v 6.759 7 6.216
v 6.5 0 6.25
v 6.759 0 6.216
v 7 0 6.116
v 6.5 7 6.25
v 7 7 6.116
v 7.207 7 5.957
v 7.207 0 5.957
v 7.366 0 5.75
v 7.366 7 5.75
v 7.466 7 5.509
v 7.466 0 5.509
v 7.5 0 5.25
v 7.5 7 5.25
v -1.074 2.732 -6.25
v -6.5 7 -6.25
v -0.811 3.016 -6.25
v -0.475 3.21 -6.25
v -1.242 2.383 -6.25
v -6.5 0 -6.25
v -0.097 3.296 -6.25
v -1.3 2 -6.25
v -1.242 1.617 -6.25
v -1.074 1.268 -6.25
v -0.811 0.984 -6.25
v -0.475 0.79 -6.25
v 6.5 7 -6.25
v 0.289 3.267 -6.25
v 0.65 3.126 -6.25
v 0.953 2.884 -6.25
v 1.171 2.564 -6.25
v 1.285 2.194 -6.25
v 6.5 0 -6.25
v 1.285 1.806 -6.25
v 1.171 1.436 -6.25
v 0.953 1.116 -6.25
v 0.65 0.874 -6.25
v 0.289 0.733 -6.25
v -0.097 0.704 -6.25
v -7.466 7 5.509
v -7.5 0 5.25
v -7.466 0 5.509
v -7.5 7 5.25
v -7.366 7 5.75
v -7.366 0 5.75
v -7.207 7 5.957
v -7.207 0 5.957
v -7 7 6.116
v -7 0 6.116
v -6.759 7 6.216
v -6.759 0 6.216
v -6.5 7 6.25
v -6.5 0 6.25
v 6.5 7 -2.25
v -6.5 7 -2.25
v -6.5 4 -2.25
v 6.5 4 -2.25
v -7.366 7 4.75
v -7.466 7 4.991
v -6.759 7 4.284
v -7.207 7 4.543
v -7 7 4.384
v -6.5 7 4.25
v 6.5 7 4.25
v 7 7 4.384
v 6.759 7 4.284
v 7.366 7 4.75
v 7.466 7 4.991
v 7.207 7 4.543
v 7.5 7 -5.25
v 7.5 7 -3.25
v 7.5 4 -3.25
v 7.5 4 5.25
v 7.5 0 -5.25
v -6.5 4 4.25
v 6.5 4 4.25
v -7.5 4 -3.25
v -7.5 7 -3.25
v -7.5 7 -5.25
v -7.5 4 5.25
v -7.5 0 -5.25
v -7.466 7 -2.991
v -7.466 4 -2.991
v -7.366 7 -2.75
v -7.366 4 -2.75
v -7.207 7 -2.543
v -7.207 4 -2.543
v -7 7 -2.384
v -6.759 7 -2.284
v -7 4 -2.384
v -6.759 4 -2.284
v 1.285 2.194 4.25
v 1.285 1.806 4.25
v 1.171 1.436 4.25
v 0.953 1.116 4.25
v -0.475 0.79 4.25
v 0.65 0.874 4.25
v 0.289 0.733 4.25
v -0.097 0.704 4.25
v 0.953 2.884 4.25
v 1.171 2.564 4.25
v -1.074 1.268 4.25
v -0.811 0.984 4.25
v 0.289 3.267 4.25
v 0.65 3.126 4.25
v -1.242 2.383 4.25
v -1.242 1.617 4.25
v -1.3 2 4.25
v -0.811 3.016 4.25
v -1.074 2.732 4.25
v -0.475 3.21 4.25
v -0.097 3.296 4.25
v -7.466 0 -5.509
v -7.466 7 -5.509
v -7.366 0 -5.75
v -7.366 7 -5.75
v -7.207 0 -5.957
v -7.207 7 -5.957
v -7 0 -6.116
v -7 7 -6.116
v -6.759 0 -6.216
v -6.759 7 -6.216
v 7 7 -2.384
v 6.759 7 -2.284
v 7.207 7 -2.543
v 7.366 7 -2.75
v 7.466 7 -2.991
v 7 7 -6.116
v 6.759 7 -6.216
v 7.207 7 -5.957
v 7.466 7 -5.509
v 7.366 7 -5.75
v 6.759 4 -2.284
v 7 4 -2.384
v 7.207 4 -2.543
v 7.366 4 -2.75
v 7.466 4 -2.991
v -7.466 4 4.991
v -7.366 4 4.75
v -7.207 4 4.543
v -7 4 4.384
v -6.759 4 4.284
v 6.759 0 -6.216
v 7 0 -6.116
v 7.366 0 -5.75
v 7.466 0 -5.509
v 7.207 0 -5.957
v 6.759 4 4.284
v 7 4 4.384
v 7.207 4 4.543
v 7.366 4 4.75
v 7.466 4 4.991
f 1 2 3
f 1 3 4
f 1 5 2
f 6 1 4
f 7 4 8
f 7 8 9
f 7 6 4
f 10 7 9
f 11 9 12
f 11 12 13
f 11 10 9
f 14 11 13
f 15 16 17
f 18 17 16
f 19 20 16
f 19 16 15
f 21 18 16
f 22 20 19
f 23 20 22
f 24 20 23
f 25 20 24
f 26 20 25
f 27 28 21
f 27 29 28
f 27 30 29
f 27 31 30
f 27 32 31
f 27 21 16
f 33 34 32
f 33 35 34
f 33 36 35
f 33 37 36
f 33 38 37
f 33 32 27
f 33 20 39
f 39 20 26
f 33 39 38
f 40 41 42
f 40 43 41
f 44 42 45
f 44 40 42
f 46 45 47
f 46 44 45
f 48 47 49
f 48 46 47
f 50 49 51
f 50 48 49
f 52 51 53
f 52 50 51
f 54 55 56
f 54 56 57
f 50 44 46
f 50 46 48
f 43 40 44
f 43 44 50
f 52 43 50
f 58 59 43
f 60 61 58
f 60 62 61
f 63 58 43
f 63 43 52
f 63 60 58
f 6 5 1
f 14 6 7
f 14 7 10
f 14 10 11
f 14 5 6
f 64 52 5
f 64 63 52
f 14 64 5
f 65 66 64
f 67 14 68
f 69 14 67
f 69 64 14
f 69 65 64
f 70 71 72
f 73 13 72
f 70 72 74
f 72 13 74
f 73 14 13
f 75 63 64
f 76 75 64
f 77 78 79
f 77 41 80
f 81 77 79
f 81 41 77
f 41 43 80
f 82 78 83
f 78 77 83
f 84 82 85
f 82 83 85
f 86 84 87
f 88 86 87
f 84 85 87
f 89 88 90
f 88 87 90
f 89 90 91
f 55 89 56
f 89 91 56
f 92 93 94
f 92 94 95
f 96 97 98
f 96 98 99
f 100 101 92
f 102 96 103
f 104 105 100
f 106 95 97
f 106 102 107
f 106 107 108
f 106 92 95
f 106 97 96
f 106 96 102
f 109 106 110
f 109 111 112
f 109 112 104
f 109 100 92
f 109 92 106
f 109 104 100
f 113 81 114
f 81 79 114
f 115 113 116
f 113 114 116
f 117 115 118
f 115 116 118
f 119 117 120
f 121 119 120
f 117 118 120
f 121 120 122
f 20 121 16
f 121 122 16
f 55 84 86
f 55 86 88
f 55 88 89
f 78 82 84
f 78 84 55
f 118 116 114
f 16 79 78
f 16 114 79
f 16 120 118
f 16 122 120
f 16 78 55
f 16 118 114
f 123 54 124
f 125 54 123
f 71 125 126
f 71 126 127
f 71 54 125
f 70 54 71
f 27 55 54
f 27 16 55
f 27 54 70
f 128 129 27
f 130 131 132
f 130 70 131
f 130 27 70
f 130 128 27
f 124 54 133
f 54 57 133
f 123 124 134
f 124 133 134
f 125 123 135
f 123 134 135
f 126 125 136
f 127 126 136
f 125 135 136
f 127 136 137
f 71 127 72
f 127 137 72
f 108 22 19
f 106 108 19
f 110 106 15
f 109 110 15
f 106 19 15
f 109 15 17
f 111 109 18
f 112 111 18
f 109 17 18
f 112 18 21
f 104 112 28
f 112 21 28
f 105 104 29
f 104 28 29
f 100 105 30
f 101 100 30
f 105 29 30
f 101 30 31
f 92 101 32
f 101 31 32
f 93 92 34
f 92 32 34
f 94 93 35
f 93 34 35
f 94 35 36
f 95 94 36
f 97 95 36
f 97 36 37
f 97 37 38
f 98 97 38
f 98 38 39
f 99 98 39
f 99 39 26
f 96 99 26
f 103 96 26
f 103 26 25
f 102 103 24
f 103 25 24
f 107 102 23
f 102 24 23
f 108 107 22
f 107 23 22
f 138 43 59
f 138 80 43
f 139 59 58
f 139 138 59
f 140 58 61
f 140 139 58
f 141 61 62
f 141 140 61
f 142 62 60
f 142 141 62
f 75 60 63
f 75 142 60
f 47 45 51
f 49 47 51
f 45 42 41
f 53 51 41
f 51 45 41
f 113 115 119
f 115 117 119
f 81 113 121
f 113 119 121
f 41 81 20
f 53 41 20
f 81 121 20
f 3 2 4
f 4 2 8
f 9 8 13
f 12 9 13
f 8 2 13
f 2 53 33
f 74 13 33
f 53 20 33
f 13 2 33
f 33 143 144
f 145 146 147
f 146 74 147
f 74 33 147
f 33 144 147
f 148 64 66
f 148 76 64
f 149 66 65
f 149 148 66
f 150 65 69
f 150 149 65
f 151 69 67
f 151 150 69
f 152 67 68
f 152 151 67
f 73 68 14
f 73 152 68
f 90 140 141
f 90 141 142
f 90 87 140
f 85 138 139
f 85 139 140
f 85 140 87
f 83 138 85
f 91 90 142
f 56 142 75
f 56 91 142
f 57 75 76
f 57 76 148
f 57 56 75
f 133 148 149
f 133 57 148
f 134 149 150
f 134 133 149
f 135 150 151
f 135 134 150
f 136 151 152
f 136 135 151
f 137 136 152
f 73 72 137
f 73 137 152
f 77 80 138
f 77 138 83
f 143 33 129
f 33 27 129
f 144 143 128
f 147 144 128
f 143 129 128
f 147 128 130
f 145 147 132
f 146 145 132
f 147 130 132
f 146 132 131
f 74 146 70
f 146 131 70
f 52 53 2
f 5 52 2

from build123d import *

# Parameters (mm, degrees)
SKETCH1_W           = 15
SKETCH1_H           = 12.5
BOSS_EXTRUDE1_DEPTH = 7
SKETCH2_W           = 15
SKETCH2_H           = 6.5
CUT_EXTRUDE2_DEPTH  = 3
SKETCH3_R           = 1.3
CUT_EXTRUDE3_DEPTH  = 10.5
FILLET1_R           = 1


with BuildPart() as part:
    # Sketch1 → Boss-Extrude1 (new body)
    with BuildSketch(Plane(origin=(0, 0, 0), x_dir=(1, 0, 0), z_dir=(0, 1, 0))):
        Rectangle(SKETCH1_W, SKETCH1_H)
    extrude(amount=BOSS_EXTRUDE1_DEPTH)

    # Sketch2 → Cut-Extrude2 (cut)
    with BuildSketch(Plane(origin=(0, 7, 0), x_dir=(1, 0, 0), z_dir=(0, 1, 0))):
        with Locations((0, -1)):
            Rectangle(SKETCH2_W, SKETCH2_H)
    extrude(amount=-CUT_EXTRUDE2_DEPTH, mode=Mode.SUBTRACT)

    # Sketch3 → Cut-Extrude3 (cut)
    with BuildSketch(Plane(origin=(0, 0, -6.25), x_dir=(-1, 0, 0), z_dir=(0, 0, -1))):
        with Locations((0, 2)):
            Circle(SKETCH3_R)
    extrude(amount=-CUT_EXTRUDE3_DEPTH, mode=Mode.SUBTRACT)

    # Fillet1
    fillet1_edges = [part.edges().sort_by_distance(p)[0] for p in [
        (7.5, 5.5, -2.25),
        (7.5, 5.5, 4.25),
        (-7.5, 5.5, 4.25),
        (-7.5, 5.5, -2.25),
        (7.5, 3.5, 6.25),
        (-7.5, 3.5, 6.25),
        (-7.5, 3.5, -6.25),
        (7.5, 3.5, -6.25),
    ]]
    fillet(fillet1_edges, radius=FILLET1_R - 0.0001)  # a hair under: the kernel refuses the full size


solid = part.part
